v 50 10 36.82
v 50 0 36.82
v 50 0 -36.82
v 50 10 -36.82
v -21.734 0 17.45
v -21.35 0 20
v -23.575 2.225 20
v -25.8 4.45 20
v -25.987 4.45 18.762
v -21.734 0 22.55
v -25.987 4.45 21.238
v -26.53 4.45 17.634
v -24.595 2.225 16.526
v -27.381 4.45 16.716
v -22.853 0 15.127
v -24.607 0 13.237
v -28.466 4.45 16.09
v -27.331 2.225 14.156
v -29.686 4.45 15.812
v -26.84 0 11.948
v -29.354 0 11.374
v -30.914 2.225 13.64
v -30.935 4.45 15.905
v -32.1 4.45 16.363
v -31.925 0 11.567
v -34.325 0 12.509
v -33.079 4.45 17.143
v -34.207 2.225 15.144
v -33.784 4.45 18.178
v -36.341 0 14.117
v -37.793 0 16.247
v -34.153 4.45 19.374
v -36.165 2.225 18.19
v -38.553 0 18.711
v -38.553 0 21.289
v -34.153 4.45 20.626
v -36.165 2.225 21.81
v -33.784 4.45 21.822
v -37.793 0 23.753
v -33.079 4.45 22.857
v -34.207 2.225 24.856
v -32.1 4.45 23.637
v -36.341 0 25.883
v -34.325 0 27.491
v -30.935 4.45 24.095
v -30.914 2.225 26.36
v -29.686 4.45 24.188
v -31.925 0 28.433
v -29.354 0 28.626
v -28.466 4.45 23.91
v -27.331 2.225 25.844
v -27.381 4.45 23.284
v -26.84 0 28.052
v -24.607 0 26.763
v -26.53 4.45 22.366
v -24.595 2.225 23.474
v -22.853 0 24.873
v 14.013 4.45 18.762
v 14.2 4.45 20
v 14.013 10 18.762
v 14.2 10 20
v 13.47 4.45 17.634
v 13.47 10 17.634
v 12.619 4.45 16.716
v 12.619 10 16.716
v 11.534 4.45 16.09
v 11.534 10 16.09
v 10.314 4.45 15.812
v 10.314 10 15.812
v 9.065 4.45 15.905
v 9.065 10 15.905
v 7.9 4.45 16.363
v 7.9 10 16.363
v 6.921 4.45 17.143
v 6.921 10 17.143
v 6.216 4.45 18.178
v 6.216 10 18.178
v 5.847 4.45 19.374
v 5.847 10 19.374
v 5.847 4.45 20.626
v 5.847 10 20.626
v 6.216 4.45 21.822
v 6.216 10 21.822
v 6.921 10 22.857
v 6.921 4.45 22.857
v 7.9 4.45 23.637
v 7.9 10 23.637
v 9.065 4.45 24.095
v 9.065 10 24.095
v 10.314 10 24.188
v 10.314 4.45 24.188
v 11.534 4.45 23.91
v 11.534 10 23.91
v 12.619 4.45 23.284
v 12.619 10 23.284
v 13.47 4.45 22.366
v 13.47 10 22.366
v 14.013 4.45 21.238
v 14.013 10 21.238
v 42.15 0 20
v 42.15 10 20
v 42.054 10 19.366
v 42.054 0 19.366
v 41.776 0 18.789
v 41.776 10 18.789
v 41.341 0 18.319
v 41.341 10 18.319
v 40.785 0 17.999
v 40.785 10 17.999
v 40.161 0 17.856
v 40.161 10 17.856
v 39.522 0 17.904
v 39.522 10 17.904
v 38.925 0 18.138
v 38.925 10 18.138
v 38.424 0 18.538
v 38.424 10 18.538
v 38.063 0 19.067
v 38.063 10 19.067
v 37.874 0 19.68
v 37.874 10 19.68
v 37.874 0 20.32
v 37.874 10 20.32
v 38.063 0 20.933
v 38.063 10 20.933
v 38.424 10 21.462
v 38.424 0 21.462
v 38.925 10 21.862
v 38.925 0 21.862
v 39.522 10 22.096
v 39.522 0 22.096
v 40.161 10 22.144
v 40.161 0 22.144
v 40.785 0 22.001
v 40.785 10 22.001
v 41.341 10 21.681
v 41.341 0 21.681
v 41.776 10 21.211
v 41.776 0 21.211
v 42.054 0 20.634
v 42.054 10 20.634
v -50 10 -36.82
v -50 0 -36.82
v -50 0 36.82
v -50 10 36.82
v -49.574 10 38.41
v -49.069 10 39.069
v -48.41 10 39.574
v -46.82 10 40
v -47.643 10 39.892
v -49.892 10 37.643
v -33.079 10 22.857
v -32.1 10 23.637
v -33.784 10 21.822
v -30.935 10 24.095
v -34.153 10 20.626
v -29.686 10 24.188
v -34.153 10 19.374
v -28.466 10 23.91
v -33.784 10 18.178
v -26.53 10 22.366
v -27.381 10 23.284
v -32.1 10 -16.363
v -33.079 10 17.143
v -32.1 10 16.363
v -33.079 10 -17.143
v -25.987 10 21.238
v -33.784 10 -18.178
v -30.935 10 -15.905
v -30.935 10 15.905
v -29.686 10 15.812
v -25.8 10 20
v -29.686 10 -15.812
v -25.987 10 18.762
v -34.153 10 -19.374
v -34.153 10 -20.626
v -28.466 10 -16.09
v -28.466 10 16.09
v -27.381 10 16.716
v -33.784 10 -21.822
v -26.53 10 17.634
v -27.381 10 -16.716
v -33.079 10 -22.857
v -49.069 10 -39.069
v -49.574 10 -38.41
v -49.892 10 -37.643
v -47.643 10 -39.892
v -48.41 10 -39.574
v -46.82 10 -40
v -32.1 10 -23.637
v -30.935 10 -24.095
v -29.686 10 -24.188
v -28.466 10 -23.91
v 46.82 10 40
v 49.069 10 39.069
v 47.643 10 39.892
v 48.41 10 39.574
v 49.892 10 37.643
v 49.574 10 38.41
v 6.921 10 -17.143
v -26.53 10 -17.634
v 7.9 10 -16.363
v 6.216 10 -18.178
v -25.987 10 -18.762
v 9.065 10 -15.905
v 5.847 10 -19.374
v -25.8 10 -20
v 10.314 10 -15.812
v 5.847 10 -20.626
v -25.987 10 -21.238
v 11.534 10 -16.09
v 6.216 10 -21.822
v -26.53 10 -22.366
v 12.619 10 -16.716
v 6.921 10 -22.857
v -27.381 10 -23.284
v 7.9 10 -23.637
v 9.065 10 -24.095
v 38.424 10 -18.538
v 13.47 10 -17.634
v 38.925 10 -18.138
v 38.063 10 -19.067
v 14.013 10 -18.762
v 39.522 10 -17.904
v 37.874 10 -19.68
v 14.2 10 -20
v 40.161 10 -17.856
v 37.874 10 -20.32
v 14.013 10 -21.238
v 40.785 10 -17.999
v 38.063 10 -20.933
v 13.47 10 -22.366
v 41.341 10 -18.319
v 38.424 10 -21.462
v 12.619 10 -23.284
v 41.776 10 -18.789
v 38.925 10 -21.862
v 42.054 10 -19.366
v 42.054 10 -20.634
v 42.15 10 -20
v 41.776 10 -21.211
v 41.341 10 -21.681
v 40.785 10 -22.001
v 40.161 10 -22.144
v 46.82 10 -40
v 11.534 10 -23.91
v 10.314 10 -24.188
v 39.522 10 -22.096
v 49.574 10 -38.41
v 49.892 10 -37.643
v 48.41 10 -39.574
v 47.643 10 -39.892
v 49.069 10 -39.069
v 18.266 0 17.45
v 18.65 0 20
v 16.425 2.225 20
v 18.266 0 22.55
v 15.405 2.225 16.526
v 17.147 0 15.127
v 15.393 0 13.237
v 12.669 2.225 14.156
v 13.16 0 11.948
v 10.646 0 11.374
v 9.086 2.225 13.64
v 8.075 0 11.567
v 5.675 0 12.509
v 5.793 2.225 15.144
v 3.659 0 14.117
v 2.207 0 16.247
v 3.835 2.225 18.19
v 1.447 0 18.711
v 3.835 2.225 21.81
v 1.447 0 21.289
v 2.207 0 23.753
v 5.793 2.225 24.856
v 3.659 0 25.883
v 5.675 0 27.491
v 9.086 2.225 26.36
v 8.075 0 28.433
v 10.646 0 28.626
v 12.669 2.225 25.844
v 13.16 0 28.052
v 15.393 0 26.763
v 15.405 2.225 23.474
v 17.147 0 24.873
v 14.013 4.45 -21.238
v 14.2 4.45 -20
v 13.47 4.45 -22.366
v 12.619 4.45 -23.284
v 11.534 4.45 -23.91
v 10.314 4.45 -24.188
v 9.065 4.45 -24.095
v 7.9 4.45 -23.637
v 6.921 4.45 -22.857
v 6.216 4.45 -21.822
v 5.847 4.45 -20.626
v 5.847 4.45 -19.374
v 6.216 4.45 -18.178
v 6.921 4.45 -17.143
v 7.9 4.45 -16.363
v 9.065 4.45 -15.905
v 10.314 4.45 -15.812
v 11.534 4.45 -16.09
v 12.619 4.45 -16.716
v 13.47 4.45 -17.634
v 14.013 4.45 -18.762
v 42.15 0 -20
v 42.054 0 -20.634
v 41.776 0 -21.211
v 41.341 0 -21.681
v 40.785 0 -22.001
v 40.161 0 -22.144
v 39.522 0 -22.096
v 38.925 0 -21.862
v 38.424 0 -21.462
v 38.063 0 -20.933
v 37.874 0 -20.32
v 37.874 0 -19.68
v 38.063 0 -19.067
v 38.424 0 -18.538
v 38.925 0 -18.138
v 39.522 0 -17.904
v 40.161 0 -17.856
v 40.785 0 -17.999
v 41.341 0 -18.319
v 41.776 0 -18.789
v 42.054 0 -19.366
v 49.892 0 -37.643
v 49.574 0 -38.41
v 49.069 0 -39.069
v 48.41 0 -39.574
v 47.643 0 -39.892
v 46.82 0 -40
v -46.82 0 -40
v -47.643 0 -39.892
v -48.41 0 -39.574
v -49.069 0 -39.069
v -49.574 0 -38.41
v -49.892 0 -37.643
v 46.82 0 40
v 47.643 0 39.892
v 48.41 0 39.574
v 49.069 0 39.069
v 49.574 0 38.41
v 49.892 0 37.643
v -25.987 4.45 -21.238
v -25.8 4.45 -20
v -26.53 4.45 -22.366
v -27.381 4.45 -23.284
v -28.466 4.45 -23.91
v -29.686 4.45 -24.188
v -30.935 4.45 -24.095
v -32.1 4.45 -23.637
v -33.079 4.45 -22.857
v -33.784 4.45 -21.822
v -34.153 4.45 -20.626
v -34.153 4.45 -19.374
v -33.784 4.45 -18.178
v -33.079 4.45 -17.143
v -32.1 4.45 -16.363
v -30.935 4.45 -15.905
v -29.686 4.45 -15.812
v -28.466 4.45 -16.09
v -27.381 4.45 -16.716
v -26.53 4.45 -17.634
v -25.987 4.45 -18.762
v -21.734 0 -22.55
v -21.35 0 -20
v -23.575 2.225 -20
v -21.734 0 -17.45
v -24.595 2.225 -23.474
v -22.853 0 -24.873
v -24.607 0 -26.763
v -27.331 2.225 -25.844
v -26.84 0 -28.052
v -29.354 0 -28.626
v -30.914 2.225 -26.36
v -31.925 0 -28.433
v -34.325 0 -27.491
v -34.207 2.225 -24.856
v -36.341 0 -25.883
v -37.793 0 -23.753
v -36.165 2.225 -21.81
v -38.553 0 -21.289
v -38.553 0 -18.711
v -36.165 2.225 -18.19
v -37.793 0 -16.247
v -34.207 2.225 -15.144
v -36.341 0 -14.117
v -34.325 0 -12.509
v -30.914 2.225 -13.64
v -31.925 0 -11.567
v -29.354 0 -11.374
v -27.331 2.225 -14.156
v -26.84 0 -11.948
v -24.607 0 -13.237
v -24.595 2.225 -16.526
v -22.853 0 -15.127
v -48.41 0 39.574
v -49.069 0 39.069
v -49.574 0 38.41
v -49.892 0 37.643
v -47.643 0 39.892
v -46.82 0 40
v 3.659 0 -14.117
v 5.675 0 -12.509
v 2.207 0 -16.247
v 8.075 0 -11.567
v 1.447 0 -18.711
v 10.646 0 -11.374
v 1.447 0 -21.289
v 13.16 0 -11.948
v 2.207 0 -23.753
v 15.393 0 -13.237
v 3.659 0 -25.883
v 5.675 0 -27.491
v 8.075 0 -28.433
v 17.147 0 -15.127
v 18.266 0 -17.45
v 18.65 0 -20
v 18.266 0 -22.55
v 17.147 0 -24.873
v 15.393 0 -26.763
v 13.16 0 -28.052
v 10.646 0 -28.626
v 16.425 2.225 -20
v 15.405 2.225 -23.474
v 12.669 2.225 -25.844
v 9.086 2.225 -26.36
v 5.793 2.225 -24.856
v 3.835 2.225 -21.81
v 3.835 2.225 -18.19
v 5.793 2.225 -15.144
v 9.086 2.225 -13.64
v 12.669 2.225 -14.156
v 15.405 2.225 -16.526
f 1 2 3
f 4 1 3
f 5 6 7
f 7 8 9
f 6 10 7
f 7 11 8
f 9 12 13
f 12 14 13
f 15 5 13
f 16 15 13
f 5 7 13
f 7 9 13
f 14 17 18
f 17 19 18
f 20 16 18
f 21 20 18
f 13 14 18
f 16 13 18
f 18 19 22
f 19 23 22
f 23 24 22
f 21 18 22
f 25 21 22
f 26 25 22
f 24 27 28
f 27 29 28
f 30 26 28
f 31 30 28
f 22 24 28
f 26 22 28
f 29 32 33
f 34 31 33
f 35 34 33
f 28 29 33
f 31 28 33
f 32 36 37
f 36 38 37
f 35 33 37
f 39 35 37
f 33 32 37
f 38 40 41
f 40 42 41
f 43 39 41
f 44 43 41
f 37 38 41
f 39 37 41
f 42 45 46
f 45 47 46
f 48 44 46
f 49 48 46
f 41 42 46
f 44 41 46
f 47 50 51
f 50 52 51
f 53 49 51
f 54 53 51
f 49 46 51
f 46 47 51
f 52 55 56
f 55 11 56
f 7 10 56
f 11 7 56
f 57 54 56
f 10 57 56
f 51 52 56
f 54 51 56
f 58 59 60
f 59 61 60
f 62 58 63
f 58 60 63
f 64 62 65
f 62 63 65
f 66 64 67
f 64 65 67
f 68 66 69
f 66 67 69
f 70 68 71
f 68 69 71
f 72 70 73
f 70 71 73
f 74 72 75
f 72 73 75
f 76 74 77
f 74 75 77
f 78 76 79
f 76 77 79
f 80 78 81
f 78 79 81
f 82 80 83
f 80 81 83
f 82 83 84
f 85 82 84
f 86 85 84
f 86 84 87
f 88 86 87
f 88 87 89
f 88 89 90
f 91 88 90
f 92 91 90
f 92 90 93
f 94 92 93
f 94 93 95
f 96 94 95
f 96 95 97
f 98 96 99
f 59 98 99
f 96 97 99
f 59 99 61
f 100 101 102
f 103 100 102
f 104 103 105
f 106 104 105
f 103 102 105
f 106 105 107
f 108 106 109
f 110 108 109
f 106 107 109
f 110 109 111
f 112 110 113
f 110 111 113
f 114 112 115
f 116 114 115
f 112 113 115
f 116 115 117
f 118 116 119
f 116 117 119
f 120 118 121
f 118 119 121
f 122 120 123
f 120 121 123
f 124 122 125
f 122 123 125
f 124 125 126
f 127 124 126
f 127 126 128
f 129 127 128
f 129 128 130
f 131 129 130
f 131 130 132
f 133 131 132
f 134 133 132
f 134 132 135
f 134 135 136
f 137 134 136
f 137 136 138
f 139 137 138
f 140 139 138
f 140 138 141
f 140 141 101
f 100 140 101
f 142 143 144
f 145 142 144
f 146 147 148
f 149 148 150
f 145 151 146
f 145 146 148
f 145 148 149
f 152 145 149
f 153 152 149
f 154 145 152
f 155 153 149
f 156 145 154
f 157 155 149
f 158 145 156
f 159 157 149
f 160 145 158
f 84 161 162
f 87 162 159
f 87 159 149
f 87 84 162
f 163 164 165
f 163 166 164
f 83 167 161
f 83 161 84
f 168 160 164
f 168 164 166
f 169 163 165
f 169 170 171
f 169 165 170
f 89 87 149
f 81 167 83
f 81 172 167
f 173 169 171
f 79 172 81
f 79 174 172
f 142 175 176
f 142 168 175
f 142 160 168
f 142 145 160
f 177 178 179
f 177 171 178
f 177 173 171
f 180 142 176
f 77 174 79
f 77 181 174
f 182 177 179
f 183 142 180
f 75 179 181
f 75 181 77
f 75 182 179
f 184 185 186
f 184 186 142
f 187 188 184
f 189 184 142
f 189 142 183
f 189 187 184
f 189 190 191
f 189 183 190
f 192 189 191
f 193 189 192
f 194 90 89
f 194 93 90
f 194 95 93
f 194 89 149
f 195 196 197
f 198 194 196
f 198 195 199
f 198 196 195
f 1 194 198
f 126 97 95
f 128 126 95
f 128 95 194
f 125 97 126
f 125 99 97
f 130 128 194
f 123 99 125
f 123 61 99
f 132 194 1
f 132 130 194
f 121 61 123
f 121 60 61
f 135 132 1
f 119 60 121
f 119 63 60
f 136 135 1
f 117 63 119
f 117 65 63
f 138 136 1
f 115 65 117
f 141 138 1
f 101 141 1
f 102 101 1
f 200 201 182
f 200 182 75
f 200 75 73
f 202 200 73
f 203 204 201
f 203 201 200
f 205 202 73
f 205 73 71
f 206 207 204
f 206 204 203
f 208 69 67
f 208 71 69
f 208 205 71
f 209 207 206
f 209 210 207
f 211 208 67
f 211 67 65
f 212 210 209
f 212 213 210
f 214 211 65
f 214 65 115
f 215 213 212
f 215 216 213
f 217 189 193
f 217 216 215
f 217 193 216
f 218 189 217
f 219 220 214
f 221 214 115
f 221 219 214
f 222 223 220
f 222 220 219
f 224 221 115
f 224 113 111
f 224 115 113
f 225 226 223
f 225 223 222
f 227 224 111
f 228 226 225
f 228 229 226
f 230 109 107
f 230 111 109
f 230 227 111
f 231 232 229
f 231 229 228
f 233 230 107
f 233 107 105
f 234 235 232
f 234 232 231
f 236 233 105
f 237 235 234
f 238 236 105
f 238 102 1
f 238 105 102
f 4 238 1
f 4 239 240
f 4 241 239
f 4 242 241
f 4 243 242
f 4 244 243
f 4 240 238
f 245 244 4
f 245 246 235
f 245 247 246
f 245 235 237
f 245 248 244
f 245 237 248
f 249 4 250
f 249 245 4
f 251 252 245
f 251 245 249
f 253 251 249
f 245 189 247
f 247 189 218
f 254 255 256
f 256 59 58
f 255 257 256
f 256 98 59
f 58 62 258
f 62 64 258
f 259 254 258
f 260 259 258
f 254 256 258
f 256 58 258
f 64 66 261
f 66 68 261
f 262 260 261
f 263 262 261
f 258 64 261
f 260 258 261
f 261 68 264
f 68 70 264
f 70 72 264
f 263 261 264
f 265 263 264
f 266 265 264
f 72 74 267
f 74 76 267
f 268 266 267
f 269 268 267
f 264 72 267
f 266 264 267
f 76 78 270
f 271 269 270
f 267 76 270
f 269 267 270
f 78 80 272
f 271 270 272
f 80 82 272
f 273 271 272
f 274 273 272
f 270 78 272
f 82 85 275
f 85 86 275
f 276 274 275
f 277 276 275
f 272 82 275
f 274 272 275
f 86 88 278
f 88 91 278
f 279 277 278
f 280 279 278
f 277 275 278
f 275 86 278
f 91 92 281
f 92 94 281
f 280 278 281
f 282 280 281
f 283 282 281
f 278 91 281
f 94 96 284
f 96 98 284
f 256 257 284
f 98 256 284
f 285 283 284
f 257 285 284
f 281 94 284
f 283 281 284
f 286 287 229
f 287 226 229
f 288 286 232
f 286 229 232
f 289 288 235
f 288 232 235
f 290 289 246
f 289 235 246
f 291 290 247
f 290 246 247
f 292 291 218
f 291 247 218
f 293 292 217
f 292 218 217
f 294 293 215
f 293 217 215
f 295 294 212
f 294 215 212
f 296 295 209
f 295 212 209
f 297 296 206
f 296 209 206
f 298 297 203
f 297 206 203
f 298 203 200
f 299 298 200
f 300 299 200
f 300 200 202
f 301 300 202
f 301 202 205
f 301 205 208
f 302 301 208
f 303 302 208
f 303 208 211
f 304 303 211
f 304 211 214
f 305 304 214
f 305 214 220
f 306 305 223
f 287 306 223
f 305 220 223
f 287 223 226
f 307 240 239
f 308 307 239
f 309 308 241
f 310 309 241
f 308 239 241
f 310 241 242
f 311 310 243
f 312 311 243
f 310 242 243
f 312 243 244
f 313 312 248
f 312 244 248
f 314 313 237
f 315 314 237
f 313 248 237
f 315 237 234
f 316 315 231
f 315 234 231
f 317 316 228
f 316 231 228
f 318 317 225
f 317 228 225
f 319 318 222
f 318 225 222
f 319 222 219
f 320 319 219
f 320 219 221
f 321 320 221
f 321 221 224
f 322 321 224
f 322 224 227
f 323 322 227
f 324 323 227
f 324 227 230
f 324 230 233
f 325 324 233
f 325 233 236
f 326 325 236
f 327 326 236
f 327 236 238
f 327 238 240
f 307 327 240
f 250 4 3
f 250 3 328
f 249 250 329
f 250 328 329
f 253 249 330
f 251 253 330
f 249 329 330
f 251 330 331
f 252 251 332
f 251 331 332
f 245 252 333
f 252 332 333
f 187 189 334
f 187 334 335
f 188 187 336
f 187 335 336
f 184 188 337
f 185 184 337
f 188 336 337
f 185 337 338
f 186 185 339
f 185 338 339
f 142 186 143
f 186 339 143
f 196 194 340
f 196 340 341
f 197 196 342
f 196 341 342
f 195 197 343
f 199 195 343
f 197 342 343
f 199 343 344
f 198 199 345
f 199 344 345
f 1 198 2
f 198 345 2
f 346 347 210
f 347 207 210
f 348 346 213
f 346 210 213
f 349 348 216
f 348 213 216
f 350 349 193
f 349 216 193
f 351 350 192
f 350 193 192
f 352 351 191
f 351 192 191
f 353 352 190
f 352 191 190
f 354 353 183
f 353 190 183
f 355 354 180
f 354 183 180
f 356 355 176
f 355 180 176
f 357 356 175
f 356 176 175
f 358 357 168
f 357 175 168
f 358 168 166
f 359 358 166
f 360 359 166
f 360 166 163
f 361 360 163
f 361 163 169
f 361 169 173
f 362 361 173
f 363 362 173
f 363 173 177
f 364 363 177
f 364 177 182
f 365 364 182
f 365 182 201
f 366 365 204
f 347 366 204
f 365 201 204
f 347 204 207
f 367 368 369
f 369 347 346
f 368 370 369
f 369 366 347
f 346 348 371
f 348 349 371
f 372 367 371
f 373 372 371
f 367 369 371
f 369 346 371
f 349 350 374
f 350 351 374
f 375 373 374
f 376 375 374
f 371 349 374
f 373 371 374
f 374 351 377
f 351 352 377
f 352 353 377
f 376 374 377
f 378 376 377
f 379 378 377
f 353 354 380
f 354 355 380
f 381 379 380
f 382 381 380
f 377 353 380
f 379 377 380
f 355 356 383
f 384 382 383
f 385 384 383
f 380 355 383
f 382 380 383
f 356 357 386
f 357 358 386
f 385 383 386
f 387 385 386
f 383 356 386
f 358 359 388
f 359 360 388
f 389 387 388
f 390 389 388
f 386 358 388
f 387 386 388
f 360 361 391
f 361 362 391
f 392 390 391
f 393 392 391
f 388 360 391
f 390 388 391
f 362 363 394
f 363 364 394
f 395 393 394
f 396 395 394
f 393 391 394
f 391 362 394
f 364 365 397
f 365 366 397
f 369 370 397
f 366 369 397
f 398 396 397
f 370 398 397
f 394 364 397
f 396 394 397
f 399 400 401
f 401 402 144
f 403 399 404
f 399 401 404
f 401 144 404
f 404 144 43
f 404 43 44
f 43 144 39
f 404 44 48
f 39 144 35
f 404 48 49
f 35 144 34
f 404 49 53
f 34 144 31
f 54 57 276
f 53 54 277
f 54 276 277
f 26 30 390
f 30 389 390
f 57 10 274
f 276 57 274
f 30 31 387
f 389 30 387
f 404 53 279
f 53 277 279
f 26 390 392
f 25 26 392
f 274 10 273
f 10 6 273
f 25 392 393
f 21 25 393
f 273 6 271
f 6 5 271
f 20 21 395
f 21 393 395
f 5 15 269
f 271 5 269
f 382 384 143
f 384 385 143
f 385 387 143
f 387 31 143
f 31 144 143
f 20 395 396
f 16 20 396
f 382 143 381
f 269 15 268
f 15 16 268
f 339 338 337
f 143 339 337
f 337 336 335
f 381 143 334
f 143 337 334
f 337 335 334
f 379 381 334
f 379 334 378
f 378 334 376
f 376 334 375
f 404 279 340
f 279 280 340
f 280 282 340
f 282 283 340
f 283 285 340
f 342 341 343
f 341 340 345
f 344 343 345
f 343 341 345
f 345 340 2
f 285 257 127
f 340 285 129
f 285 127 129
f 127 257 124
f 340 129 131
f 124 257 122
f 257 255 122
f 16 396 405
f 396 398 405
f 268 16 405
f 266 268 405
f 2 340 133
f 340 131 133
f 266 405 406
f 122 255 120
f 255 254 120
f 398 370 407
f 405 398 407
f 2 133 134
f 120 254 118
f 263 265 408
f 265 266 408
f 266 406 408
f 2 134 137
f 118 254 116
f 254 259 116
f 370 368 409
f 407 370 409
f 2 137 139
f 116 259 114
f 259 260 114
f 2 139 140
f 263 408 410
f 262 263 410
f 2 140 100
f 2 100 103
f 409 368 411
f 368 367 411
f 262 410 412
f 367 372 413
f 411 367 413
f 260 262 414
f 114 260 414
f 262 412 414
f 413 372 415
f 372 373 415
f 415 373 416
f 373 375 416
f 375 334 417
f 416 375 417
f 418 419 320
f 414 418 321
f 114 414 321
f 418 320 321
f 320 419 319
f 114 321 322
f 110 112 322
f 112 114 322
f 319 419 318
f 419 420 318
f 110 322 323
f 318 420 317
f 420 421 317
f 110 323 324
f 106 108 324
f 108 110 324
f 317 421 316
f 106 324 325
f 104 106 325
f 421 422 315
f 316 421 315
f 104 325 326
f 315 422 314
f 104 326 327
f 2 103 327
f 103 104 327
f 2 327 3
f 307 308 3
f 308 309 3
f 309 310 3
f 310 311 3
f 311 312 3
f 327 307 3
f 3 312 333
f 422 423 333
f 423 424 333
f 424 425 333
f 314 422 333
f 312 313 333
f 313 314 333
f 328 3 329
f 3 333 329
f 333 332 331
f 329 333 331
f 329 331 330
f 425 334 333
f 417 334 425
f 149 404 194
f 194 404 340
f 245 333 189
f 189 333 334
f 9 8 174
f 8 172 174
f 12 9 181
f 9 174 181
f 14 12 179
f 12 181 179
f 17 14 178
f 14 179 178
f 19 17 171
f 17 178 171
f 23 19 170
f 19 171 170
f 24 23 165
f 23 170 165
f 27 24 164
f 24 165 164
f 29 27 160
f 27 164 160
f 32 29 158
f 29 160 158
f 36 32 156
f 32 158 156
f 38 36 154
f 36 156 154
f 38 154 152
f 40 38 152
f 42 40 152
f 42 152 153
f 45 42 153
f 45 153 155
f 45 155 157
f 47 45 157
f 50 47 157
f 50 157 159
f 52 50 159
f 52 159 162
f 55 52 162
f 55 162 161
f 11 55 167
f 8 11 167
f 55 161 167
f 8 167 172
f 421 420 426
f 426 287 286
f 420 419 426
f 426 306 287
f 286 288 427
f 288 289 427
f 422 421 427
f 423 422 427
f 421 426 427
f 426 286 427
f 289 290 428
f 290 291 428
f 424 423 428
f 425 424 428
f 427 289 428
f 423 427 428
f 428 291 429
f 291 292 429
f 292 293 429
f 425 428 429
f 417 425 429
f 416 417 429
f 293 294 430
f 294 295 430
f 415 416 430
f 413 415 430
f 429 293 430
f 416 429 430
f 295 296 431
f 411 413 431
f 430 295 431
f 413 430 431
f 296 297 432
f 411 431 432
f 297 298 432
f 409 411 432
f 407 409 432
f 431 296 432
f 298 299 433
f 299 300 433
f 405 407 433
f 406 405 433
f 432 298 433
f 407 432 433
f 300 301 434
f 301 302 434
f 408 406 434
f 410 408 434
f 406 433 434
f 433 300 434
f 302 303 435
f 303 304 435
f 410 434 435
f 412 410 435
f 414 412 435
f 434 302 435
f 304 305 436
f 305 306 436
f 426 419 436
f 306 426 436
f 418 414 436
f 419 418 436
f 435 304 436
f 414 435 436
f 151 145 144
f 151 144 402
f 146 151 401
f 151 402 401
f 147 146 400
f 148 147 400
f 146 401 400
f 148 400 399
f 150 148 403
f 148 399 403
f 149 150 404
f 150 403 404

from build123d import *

# Parameters (mm, degrees)
BOSS_EXTRUDE1_DEPTH                             = 10
CSK_FOR_M8_FLAT_HEAD_MACHINE_SCREW1_D           = 8.4
CSK_FOR_M8_FLAT_HEAD_MACHINE_SCREW1_CSINK_D     = 17.3
CSK_FOR_M8_FLAT_HEAD_MACHINE_SCREW1_CSINK_ANGLE = 90
M4_CLEARANCE_HOLE1_D                            = 4.3


with BuildPart() as part:
    # Sketch1 → Boss-Extrude1 (new body)
    with BuildSketch(Plane(origin=(0, 0, 0), x_dir=(1, 0, 0), z_dir=(0, 1, 0))):
        with BuildLine():
            Line((-46.82, -40), (46.82, -40))
            ThreePointArc((46.82, -40), (49.068599564, -39.068599564), (50, -36.82))
            Line((50, -36.82), (50, 36.82))
            ThreePointArc((50, 36.82), (49.068599564, 39.068599564), (46.82, 40))
            Line((46.82, 40), (-46.82, 40))
            ThreePointArc((-46.82, 40), (-49.068599564, 39.068599564), (-50, 36.82))
            Line((-50, 36.82), (-50, -36.82))
            ThreePointArc((-50, -36.82), (-49.068599564, -39.068599564), (-46.82, -40))
        make_face()
    extrude(amount=BOSS_EXTRUDE1_DEPTH)

    # CSK for M8 Flat Head Machine Screw1 (through all)
    with Locations(Plane(origin=(0, 0, 0), x_dir=(-1, 0, 0), z_dir=(0, -1, 0))):
        with Locations((-10, 20), (30, 20), (30, -20), (-10, -20)):
            CounterSinkHole(CSK_FOR_M8_FLAT_HEAD_MACHINE_SCREW1_D / 2, CSK_FOR_M8_FLAT_HEAD_MACHINE_SCREW1_CSINK_D / 2, counter_sink_angle=CSK_FOR_M8_FLAT_HEAD_MACHINE_SCREW1_CSINK_ANGLE)

    # M4 Clearance Hole1 (through all)
    with Locations(Plane(origin=(0, 0, 0), x_dir=(-1, 0, 0), z_dir=(0, -1, 0))):
        with Locations((-40, 20), (-40, -20)):
            Hole(M4_CLEARANCE_HOLE1_D / 2)


solid = part.part
